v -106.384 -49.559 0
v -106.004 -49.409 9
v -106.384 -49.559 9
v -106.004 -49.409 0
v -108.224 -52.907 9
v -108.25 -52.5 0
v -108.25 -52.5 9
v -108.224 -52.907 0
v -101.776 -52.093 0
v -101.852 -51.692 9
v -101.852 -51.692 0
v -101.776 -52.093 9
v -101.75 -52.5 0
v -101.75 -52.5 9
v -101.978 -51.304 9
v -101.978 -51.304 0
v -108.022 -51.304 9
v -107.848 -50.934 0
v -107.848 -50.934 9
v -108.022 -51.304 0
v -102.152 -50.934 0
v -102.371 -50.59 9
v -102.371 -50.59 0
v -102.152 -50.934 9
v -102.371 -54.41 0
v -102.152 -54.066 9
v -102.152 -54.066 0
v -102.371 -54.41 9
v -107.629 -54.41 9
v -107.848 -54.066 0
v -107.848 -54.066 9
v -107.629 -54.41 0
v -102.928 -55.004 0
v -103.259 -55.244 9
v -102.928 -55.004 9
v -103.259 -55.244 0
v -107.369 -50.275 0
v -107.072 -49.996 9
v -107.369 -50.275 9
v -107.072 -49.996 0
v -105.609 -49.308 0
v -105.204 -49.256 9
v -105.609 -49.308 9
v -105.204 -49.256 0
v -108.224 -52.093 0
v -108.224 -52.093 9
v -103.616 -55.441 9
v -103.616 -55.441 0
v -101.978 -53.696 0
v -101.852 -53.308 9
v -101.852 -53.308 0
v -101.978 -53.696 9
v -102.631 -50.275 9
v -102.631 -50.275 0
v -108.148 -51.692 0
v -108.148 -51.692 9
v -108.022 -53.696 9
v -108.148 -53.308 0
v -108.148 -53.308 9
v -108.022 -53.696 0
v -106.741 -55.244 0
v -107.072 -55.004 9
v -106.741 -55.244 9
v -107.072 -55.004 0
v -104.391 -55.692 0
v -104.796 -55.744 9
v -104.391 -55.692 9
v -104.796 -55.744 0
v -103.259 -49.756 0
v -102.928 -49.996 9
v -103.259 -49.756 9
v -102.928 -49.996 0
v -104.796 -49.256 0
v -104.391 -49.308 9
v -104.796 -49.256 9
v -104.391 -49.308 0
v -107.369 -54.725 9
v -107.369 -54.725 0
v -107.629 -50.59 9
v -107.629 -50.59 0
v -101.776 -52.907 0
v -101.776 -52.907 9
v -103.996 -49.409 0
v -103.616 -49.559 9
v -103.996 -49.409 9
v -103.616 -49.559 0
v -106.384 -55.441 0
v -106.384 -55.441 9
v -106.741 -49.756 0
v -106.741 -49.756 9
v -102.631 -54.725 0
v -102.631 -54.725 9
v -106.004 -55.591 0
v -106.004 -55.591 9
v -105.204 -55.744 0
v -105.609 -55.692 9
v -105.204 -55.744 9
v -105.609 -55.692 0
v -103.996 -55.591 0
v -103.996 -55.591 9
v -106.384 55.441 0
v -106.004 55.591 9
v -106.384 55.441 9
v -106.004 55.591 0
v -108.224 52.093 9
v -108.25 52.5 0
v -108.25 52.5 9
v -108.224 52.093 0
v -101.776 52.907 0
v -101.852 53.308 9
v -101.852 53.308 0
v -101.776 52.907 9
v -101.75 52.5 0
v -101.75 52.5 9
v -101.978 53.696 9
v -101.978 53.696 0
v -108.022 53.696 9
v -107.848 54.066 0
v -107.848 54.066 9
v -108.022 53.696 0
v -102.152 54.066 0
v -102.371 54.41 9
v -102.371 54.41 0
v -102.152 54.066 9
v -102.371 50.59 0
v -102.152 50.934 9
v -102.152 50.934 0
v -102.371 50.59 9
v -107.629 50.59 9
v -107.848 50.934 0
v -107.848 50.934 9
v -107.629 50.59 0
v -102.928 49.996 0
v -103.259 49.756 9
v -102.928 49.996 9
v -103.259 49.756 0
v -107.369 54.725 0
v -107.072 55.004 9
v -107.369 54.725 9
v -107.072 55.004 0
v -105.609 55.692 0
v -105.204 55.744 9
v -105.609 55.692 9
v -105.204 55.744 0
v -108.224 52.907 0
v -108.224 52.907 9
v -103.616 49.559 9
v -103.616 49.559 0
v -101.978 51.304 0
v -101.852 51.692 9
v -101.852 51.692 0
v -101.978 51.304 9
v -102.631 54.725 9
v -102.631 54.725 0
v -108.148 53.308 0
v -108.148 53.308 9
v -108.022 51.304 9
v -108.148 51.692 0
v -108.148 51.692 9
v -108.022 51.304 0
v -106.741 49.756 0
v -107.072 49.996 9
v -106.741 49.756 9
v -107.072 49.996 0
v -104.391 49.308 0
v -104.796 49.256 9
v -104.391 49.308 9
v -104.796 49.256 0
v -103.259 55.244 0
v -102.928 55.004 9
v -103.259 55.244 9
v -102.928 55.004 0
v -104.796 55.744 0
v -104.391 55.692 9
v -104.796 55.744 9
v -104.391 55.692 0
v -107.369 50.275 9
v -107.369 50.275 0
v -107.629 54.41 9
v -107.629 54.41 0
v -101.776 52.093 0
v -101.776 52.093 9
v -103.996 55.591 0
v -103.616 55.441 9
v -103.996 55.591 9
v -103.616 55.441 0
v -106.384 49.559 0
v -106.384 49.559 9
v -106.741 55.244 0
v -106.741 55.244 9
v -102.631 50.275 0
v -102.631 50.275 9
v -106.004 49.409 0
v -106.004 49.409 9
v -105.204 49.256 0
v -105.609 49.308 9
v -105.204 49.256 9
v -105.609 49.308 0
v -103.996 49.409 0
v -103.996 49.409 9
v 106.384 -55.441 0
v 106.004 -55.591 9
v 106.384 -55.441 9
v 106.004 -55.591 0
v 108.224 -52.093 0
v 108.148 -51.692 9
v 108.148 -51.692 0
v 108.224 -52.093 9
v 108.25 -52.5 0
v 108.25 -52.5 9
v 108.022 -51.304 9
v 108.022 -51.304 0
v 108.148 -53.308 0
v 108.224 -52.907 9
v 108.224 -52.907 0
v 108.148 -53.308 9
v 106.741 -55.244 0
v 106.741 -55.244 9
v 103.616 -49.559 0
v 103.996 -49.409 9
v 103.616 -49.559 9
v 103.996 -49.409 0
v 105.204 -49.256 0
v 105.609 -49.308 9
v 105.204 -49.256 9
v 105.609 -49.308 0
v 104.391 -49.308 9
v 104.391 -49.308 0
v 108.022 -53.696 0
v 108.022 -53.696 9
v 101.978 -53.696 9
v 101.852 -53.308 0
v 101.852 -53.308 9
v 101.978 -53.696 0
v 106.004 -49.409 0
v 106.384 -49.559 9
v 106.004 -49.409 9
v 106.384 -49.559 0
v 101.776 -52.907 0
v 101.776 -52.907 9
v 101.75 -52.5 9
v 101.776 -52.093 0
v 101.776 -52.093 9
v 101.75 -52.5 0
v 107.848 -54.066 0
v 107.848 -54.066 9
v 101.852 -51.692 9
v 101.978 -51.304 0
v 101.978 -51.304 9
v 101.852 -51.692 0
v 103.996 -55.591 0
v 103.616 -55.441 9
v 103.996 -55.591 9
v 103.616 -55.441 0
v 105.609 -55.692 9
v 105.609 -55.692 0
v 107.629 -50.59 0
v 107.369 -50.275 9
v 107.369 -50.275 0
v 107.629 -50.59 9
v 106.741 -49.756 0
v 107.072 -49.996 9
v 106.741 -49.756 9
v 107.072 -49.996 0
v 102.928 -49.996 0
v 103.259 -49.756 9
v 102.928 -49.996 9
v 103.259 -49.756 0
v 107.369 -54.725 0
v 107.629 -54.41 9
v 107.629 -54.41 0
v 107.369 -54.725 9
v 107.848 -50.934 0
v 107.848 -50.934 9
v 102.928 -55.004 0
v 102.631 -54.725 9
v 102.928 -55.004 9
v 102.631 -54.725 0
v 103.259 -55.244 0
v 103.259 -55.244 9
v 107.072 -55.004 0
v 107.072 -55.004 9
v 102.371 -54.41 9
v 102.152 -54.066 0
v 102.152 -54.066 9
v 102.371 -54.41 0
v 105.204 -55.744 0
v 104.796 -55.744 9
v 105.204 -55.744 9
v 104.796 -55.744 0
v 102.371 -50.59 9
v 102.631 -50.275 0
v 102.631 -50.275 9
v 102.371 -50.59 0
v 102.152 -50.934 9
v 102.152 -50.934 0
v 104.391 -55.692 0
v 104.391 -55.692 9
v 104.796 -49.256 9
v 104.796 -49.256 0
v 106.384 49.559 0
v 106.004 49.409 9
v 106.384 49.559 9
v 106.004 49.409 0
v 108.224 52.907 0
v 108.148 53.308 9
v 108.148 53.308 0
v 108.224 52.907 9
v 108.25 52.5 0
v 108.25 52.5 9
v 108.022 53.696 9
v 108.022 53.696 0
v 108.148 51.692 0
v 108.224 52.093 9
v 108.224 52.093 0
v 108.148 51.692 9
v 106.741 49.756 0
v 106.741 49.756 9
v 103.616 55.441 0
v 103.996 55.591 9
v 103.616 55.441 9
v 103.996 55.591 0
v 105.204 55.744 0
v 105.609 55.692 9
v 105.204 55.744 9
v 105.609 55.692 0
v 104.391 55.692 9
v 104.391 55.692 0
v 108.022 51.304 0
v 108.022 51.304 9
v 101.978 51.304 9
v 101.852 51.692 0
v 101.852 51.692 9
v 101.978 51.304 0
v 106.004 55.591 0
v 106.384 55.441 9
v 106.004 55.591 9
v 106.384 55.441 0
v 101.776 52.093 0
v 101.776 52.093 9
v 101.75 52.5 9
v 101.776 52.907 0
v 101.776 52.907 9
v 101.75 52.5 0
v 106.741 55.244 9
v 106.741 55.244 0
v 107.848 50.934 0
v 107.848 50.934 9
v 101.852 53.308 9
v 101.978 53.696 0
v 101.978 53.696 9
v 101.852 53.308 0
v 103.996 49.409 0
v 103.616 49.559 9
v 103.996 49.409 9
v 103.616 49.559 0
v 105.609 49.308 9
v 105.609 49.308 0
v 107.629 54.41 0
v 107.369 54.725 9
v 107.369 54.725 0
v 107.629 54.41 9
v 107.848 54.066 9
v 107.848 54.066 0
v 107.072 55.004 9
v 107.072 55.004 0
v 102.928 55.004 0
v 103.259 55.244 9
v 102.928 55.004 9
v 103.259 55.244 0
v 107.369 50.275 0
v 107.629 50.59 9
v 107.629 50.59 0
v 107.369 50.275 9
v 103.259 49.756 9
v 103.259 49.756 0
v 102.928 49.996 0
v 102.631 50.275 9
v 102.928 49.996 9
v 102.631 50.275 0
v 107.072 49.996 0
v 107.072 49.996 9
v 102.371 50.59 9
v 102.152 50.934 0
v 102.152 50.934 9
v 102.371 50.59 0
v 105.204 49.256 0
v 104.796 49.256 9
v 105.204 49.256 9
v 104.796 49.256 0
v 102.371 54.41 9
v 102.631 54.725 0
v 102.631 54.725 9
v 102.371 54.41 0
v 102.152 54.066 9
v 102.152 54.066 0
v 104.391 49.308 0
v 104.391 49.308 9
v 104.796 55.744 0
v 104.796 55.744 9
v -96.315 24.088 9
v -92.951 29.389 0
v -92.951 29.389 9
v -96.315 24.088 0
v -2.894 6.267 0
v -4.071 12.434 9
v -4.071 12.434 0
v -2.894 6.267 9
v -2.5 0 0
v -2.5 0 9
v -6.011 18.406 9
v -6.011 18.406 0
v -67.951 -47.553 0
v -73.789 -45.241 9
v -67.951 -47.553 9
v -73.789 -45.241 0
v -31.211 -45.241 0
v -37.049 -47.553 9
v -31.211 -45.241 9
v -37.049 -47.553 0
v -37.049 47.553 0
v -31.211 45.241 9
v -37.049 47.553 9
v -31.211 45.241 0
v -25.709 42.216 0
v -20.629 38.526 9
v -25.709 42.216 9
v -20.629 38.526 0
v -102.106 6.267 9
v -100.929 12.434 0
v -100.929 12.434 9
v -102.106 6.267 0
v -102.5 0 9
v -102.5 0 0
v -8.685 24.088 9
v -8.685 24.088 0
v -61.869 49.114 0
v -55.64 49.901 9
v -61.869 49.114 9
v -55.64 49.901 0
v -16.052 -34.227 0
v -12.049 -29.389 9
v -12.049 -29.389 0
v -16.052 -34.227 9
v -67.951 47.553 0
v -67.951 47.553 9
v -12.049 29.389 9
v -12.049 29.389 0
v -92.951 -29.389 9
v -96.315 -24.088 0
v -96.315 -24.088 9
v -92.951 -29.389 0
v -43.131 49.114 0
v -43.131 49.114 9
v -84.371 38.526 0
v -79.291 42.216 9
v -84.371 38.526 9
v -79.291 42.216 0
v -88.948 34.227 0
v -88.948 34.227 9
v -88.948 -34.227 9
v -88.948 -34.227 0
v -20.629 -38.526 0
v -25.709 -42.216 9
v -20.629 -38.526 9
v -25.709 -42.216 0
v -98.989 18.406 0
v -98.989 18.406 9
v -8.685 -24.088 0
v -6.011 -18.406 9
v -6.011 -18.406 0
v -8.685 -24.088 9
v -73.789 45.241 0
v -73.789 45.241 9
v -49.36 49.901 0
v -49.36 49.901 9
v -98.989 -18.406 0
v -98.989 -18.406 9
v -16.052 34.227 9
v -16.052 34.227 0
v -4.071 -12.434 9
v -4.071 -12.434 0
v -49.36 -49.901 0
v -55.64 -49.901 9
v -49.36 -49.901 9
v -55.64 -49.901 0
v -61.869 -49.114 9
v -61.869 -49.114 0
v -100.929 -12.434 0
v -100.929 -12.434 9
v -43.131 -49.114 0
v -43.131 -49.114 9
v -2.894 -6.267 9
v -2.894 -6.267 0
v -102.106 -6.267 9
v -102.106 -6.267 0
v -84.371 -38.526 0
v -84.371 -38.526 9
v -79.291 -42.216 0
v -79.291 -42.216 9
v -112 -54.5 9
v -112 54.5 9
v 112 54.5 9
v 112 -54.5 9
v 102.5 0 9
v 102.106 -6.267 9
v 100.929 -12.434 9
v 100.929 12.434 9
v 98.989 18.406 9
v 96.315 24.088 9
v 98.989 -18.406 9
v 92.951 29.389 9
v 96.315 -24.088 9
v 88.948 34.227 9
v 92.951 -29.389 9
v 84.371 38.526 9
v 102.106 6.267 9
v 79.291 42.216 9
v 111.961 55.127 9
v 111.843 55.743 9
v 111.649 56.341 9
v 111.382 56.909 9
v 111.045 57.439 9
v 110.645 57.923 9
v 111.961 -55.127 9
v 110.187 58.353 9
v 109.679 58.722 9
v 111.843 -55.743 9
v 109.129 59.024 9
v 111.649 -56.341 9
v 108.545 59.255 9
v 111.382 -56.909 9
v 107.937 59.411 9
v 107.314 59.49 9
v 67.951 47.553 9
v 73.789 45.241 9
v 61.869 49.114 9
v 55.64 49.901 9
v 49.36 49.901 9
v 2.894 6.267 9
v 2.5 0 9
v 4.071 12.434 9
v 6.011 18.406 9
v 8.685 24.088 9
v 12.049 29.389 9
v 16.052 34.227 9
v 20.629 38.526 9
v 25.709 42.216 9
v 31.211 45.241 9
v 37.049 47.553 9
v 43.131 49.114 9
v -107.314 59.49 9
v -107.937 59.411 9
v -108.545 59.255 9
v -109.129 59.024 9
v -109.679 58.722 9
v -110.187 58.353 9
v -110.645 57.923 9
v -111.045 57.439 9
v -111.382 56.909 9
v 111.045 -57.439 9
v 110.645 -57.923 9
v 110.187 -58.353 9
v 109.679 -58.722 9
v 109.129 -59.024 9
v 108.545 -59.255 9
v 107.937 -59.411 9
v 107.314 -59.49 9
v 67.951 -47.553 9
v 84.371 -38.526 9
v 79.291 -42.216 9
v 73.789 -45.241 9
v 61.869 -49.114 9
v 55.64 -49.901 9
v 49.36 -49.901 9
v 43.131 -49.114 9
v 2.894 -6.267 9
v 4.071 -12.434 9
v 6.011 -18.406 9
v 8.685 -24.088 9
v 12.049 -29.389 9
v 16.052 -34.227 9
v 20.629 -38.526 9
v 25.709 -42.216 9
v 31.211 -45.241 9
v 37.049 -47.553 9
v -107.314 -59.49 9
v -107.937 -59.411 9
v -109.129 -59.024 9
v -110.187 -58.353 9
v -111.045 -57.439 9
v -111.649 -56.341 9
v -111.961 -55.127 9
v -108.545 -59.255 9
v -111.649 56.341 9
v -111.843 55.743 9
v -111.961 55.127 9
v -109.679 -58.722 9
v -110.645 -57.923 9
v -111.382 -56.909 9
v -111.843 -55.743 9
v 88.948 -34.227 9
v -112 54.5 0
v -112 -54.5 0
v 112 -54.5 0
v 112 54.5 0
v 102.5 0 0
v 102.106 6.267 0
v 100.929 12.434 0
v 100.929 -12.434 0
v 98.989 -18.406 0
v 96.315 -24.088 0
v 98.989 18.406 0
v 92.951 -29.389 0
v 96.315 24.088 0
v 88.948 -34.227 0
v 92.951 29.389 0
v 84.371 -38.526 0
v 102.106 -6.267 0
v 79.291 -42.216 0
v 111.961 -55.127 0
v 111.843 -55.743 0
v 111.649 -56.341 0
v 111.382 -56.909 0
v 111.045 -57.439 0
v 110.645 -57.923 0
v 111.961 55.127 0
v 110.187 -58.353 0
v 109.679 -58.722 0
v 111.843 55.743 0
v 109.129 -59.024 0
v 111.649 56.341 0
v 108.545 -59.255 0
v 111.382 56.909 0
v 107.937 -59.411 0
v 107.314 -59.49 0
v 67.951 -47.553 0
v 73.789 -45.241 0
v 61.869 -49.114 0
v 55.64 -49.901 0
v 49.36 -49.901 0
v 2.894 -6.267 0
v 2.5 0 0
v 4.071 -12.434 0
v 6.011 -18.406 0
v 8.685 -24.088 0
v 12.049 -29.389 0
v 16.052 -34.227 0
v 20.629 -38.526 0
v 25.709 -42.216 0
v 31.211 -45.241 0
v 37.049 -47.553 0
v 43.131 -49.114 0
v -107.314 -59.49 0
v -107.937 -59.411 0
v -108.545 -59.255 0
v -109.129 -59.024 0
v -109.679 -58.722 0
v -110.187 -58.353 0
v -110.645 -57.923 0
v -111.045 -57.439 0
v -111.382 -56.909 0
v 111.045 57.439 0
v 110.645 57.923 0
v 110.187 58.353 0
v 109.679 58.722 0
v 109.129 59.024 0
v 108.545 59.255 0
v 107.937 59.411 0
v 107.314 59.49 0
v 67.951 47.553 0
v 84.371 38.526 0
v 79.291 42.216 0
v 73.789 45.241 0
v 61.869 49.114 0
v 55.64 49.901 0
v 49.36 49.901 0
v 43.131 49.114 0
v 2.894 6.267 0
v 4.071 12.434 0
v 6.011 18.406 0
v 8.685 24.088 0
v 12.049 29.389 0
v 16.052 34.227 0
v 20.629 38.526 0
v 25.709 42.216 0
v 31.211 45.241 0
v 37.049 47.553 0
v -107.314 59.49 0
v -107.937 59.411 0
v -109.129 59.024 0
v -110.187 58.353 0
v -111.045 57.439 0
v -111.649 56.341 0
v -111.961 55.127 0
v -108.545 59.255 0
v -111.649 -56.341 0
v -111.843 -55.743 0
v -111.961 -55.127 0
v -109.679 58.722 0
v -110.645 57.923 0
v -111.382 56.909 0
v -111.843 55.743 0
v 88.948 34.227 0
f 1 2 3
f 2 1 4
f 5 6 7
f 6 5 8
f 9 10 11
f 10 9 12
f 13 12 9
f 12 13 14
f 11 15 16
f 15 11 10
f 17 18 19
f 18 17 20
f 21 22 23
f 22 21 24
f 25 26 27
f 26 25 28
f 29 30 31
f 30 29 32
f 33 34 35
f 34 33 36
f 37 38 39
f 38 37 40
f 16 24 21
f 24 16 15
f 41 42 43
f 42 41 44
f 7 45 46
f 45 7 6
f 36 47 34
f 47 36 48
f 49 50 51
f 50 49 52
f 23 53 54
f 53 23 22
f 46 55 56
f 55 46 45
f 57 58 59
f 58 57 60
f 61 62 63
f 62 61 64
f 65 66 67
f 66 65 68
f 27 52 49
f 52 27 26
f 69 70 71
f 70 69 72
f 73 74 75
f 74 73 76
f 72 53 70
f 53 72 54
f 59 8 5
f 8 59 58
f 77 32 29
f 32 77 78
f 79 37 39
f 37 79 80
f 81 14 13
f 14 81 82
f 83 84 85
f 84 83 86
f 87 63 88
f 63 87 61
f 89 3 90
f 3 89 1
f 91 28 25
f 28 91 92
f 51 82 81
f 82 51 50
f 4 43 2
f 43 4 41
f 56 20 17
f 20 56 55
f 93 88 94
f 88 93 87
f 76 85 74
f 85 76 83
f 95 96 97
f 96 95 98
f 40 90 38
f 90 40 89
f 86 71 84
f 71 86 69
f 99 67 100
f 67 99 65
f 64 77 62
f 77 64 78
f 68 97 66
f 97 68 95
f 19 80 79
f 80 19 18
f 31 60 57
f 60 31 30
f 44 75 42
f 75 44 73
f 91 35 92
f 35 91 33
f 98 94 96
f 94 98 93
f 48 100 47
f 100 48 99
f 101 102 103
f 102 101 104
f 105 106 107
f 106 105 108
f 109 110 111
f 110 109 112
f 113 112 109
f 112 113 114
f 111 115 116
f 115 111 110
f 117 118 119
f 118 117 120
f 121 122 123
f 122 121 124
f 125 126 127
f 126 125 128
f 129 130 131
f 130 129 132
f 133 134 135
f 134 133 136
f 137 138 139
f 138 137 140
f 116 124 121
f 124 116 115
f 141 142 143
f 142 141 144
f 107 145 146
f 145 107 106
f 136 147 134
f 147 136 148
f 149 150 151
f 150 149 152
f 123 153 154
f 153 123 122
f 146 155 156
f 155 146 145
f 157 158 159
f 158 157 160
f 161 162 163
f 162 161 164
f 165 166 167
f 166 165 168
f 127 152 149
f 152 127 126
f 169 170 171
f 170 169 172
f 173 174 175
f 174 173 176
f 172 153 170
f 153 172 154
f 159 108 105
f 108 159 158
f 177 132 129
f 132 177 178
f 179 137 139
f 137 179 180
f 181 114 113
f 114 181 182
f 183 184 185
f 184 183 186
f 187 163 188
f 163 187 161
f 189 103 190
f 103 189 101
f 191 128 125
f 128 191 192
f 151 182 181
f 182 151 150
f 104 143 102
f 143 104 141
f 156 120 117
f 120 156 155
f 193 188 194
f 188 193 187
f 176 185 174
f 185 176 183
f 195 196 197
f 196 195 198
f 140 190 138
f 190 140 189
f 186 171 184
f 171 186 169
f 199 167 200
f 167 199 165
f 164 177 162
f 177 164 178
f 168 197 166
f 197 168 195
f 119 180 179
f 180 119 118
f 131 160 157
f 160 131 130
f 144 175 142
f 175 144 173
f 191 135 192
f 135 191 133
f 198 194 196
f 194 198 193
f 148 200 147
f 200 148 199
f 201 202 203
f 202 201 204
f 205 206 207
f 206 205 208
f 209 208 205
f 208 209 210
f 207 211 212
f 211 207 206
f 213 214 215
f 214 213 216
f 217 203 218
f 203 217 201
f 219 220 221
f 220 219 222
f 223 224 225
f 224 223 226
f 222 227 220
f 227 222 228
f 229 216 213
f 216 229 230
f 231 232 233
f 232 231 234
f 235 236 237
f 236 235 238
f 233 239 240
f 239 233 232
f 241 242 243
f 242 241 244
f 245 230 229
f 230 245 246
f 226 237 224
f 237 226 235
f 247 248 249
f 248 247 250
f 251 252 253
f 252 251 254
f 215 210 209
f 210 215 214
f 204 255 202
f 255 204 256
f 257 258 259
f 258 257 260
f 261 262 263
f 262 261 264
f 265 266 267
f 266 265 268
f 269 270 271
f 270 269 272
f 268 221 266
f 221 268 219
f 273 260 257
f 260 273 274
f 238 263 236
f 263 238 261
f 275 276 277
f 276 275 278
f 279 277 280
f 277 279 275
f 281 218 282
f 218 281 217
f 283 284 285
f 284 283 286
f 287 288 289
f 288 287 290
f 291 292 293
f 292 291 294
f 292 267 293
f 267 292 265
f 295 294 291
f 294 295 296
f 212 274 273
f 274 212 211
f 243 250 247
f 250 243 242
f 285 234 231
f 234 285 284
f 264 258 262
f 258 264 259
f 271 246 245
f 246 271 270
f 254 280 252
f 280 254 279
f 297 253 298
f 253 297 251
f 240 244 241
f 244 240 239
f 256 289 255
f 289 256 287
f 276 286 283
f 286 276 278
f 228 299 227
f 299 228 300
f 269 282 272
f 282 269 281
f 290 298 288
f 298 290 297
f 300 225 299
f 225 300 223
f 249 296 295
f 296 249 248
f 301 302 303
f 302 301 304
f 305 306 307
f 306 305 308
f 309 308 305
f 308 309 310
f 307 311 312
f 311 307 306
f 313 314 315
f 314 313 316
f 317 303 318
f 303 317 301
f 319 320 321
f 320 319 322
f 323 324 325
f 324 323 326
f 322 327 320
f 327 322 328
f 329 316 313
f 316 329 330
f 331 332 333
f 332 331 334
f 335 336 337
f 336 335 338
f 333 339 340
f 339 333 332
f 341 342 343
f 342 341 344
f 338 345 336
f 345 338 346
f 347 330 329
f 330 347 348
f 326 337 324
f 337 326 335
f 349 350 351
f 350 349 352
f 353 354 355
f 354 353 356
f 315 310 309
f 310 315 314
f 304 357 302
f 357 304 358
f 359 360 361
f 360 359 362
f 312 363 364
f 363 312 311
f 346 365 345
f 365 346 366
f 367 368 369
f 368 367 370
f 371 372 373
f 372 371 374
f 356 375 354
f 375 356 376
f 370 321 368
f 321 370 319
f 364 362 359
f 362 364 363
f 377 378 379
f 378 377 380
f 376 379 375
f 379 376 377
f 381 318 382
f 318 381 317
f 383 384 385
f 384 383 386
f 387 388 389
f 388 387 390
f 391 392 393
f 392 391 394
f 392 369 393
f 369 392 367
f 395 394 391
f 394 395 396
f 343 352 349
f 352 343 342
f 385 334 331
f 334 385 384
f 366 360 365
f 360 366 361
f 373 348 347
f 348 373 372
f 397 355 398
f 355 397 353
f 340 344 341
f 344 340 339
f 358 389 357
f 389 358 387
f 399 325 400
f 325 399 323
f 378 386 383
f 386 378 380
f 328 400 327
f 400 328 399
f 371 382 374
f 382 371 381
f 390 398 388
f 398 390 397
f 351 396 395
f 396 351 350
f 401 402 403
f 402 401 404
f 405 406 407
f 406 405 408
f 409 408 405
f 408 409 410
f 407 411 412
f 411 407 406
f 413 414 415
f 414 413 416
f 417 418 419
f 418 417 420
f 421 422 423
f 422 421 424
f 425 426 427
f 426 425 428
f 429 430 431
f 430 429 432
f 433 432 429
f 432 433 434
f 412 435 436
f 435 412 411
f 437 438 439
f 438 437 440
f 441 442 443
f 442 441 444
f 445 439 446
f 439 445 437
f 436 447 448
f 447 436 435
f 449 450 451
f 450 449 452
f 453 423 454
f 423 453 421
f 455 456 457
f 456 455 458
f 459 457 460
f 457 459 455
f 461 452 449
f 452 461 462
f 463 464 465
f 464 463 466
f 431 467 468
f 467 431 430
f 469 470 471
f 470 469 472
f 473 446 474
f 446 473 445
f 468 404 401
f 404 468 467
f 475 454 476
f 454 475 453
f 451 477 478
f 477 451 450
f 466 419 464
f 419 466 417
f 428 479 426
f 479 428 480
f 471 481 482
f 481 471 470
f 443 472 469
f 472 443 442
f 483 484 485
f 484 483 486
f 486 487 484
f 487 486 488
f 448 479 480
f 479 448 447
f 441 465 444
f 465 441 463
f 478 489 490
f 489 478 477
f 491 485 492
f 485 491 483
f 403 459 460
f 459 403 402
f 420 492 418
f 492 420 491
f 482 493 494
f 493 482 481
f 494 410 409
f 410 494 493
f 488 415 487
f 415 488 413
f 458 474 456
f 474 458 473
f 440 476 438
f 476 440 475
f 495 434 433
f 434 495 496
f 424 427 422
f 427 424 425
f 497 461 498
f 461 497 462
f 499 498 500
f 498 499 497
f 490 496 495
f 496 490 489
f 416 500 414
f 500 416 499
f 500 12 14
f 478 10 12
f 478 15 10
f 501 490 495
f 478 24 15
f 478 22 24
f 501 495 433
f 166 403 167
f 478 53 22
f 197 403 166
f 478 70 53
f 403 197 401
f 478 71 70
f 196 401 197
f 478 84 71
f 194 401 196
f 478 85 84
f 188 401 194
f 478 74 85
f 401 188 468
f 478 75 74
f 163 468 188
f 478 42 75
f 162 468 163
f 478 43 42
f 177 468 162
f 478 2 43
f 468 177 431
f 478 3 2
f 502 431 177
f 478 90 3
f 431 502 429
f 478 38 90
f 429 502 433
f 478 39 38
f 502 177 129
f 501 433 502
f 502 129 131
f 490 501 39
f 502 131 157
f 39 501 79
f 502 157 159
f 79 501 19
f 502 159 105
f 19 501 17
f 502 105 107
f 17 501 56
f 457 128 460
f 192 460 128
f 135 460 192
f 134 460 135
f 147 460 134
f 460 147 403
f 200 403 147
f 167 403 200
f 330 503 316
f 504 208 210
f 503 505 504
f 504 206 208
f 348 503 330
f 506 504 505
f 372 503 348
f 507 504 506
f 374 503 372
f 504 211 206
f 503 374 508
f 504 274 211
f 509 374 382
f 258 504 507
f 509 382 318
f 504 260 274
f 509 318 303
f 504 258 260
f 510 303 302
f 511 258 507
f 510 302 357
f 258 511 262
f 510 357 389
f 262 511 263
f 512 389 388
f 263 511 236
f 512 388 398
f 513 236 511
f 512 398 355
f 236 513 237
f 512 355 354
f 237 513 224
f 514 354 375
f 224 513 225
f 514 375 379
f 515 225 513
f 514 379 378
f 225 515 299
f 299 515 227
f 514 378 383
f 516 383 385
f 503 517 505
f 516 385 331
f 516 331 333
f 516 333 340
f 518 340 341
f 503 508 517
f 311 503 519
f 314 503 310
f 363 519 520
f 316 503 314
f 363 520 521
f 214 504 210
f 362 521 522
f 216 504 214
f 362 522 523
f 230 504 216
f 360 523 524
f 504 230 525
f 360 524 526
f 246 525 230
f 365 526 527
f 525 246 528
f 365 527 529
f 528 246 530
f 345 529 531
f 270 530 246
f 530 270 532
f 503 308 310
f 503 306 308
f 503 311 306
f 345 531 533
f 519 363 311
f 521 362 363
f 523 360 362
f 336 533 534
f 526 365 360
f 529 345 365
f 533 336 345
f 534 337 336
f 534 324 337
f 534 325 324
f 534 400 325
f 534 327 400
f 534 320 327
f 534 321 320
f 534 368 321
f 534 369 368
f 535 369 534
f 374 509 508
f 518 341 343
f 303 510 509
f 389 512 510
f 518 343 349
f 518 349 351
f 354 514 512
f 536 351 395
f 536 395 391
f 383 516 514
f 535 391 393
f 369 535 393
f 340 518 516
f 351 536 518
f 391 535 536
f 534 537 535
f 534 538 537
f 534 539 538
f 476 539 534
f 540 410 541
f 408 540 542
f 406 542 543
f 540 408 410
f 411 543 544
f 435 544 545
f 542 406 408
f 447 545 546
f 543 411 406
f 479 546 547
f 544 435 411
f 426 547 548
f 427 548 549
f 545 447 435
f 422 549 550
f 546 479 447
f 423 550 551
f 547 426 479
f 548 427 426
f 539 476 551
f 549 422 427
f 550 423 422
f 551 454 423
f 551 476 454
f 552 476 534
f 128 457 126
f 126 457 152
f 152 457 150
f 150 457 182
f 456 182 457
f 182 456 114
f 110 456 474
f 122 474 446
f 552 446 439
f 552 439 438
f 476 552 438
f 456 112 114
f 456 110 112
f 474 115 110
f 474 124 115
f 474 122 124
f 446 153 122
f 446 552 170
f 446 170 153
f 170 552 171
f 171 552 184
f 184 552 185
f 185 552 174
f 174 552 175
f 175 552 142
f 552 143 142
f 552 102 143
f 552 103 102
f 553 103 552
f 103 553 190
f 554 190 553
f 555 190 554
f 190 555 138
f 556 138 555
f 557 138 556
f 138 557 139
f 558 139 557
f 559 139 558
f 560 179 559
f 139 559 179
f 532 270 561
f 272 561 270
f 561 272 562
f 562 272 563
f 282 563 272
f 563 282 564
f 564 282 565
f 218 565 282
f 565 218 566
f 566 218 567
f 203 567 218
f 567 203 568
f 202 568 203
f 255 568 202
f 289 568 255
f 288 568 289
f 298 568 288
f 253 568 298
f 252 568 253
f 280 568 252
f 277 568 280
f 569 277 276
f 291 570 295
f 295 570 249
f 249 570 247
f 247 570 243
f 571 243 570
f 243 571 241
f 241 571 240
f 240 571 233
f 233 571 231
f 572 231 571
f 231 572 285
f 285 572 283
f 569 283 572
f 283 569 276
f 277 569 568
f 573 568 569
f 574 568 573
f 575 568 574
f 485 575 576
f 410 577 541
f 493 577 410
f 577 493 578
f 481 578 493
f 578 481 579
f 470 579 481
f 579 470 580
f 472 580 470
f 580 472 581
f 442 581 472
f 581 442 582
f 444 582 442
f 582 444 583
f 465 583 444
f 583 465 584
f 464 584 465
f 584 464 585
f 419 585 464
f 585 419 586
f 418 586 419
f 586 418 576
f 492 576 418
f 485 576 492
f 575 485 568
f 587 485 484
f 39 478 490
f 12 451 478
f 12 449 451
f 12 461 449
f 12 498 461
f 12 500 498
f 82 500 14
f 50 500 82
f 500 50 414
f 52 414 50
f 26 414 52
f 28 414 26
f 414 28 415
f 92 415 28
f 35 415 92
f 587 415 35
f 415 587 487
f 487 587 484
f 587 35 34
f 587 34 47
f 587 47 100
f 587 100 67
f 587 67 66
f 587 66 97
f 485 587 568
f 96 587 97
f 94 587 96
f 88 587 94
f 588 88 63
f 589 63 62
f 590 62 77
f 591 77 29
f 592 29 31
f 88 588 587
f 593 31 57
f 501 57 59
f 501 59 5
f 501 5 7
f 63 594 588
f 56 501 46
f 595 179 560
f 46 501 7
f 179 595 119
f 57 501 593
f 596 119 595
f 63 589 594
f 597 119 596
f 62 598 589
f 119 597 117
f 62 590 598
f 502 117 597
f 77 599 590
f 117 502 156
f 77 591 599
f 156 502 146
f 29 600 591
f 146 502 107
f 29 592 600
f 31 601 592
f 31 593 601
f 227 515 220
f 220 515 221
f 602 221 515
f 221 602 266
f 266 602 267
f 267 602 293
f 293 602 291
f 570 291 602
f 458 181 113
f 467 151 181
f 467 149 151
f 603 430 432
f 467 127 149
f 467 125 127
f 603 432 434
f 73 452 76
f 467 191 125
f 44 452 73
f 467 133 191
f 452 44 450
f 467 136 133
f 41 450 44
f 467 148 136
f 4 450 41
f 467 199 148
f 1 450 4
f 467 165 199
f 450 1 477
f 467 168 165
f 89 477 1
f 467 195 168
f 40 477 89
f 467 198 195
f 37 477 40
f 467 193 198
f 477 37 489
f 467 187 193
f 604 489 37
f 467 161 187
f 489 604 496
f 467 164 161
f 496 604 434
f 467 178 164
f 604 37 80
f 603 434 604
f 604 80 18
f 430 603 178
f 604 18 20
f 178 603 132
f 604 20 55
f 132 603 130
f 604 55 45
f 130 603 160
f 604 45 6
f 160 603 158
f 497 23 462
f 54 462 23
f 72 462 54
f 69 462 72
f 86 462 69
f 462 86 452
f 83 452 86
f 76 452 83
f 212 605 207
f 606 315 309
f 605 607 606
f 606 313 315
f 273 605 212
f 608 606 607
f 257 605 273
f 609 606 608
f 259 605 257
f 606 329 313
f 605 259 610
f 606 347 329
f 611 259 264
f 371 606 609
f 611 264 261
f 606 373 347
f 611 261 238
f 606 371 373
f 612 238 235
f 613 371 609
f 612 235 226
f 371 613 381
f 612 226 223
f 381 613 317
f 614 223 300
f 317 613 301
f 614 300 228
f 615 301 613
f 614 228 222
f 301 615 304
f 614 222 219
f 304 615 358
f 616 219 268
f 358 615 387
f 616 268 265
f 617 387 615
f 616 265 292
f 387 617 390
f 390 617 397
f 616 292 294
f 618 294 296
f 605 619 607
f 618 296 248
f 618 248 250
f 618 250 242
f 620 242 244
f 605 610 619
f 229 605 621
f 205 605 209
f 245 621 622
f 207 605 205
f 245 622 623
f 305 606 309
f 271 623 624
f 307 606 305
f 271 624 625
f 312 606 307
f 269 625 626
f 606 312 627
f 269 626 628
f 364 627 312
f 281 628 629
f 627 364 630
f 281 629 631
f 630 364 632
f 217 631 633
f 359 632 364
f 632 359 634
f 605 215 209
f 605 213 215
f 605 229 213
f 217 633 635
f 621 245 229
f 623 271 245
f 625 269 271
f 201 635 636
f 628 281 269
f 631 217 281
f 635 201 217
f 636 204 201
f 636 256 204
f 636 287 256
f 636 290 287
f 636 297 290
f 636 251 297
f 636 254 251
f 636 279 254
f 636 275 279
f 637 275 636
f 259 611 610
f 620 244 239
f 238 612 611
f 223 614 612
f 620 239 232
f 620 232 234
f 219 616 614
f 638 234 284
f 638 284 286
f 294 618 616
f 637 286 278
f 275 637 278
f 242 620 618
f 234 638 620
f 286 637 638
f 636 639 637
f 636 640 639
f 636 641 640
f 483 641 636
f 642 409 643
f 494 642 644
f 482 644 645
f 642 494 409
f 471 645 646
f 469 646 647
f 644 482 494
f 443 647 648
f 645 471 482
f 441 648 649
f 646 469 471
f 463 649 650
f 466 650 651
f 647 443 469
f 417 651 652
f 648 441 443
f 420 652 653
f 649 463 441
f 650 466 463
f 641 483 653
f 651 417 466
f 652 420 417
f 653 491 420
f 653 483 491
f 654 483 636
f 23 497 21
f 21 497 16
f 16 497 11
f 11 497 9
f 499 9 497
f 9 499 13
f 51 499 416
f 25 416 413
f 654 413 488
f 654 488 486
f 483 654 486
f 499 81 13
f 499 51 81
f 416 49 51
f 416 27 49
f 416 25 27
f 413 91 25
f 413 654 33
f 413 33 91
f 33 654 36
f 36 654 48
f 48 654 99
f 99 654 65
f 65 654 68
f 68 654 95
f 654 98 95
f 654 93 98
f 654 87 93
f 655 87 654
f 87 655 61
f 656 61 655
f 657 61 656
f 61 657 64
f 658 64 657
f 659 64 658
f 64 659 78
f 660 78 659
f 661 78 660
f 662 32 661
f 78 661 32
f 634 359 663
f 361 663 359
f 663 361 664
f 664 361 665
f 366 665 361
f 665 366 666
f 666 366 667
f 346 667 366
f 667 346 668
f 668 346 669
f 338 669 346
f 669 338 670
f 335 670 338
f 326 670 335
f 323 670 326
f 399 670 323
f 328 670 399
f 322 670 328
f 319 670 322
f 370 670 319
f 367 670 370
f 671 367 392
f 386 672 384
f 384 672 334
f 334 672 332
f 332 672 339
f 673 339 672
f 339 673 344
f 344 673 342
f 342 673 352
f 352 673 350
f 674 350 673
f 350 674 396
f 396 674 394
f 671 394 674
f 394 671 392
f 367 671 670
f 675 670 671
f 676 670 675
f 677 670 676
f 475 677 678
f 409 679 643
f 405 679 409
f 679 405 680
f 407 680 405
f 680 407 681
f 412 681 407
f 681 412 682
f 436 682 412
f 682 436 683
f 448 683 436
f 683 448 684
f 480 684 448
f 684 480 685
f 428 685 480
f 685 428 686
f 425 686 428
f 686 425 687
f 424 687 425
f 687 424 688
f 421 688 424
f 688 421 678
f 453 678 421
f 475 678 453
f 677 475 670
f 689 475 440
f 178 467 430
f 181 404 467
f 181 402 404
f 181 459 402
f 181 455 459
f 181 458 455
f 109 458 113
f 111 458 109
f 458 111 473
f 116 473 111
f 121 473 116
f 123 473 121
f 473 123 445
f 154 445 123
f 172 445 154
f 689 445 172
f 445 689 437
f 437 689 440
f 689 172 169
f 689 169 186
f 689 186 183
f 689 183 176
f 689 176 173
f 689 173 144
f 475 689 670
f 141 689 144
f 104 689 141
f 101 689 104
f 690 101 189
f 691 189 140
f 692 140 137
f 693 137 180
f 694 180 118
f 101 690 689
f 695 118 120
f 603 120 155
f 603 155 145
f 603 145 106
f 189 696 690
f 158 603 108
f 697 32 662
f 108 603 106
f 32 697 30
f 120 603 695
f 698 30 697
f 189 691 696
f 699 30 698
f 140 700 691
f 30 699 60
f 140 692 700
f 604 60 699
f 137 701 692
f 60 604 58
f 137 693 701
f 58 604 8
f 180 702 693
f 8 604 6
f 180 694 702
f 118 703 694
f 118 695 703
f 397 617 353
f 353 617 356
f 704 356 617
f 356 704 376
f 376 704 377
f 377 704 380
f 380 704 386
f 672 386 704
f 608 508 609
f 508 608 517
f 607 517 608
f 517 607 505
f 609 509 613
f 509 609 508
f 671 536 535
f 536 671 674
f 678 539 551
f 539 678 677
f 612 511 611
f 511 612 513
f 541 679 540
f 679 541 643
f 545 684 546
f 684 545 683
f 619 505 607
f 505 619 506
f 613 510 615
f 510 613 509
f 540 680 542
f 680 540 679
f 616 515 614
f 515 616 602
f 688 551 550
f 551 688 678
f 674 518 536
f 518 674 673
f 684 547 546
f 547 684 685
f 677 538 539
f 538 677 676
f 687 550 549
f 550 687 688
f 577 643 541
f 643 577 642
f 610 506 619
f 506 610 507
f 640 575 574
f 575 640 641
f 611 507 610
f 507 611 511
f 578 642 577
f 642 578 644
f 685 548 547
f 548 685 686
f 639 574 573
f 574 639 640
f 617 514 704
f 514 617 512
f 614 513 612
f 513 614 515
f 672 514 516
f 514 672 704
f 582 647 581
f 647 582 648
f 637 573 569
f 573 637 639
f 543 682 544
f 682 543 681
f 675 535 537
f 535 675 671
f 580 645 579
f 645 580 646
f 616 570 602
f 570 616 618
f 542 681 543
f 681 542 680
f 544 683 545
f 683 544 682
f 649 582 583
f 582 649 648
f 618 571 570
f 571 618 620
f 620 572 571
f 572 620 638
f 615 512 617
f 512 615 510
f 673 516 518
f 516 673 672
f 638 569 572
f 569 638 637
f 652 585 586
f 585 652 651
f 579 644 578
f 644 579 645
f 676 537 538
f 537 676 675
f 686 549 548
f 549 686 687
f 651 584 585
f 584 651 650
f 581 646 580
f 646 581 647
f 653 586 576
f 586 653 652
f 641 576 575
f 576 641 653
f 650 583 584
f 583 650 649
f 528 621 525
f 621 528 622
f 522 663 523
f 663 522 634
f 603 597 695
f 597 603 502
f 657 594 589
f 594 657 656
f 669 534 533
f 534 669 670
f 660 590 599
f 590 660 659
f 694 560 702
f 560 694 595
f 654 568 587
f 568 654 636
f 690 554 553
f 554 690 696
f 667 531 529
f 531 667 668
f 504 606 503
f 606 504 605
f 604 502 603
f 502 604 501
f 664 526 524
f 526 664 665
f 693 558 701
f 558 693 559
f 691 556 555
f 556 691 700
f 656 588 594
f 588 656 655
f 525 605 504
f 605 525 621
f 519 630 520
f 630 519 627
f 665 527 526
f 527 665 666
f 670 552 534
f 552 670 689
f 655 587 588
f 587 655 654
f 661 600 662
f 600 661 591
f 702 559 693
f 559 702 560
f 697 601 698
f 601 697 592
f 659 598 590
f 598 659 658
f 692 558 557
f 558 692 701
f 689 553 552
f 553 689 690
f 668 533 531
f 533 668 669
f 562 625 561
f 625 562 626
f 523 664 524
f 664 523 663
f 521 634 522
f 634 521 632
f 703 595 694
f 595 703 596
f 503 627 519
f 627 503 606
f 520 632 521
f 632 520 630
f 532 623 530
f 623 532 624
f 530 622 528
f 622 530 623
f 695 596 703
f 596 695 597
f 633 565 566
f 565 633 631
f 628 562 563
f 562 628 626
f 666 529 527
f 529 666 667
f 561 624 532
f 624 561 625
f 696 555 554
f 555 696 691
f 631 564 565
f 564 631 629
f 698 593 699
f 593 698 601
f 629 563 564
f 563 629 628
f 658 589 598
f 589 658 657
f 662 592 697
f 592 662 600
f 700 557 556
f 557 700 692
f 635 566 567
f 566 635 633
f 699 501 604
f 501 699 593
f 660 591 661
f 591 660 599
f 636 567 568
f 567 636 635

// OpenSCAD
$fn = 50;


difference() {
	union() {
		hull() {
			translate(v = [-107.0000000000, 54.5000000000, 0]) {
				cylinder(h = 9, r = 5);
			}
			translate(v = [107.0000000000, 54.5000000000, 0]) {
				cylinder(h = 9, r = 5);
			}
			translate(v = [-107.0000000000, -54.5000000000, 0]) {
				cylinder(h = 9, r = 5);
			}
			translate(v = [107.0000000000, -54.5000000000, 0]) {
				cylinder(h = 9, r = 5);
			}
		}
	}
	union() {
		#translate(v = [-105.0000000000, -52.5000000000, -100.0000000000]) {
			cylinder(h = 200, r = 3.2500000000);
		}
		#translate(v = [-105.0000000000, 52.5000000000, -100.0000000000]) {
			cylinder(h = 200, r = 3.2500000000);
		}
		#translate(v = [105.0000000000, -52.5000000000, -100.0000000000]) {
			cylinder(h = 200, r = 3.2500000000);
		}
		#translate(v = [105.0000000000, 52.5000000000, -100.0000000000]) {
			cylinder(h = 200, r = 3.2500000000);
		}
		#translate(v = [-52.5000000000, 0, 0]) {
			cylinder(h = 9, r = 50.0000000000);
		}
		#translate(v = [52.5000000000, 0, 0]) {
			cylinder(h = 9, r = 50.0000000000);
		}
	}
}
